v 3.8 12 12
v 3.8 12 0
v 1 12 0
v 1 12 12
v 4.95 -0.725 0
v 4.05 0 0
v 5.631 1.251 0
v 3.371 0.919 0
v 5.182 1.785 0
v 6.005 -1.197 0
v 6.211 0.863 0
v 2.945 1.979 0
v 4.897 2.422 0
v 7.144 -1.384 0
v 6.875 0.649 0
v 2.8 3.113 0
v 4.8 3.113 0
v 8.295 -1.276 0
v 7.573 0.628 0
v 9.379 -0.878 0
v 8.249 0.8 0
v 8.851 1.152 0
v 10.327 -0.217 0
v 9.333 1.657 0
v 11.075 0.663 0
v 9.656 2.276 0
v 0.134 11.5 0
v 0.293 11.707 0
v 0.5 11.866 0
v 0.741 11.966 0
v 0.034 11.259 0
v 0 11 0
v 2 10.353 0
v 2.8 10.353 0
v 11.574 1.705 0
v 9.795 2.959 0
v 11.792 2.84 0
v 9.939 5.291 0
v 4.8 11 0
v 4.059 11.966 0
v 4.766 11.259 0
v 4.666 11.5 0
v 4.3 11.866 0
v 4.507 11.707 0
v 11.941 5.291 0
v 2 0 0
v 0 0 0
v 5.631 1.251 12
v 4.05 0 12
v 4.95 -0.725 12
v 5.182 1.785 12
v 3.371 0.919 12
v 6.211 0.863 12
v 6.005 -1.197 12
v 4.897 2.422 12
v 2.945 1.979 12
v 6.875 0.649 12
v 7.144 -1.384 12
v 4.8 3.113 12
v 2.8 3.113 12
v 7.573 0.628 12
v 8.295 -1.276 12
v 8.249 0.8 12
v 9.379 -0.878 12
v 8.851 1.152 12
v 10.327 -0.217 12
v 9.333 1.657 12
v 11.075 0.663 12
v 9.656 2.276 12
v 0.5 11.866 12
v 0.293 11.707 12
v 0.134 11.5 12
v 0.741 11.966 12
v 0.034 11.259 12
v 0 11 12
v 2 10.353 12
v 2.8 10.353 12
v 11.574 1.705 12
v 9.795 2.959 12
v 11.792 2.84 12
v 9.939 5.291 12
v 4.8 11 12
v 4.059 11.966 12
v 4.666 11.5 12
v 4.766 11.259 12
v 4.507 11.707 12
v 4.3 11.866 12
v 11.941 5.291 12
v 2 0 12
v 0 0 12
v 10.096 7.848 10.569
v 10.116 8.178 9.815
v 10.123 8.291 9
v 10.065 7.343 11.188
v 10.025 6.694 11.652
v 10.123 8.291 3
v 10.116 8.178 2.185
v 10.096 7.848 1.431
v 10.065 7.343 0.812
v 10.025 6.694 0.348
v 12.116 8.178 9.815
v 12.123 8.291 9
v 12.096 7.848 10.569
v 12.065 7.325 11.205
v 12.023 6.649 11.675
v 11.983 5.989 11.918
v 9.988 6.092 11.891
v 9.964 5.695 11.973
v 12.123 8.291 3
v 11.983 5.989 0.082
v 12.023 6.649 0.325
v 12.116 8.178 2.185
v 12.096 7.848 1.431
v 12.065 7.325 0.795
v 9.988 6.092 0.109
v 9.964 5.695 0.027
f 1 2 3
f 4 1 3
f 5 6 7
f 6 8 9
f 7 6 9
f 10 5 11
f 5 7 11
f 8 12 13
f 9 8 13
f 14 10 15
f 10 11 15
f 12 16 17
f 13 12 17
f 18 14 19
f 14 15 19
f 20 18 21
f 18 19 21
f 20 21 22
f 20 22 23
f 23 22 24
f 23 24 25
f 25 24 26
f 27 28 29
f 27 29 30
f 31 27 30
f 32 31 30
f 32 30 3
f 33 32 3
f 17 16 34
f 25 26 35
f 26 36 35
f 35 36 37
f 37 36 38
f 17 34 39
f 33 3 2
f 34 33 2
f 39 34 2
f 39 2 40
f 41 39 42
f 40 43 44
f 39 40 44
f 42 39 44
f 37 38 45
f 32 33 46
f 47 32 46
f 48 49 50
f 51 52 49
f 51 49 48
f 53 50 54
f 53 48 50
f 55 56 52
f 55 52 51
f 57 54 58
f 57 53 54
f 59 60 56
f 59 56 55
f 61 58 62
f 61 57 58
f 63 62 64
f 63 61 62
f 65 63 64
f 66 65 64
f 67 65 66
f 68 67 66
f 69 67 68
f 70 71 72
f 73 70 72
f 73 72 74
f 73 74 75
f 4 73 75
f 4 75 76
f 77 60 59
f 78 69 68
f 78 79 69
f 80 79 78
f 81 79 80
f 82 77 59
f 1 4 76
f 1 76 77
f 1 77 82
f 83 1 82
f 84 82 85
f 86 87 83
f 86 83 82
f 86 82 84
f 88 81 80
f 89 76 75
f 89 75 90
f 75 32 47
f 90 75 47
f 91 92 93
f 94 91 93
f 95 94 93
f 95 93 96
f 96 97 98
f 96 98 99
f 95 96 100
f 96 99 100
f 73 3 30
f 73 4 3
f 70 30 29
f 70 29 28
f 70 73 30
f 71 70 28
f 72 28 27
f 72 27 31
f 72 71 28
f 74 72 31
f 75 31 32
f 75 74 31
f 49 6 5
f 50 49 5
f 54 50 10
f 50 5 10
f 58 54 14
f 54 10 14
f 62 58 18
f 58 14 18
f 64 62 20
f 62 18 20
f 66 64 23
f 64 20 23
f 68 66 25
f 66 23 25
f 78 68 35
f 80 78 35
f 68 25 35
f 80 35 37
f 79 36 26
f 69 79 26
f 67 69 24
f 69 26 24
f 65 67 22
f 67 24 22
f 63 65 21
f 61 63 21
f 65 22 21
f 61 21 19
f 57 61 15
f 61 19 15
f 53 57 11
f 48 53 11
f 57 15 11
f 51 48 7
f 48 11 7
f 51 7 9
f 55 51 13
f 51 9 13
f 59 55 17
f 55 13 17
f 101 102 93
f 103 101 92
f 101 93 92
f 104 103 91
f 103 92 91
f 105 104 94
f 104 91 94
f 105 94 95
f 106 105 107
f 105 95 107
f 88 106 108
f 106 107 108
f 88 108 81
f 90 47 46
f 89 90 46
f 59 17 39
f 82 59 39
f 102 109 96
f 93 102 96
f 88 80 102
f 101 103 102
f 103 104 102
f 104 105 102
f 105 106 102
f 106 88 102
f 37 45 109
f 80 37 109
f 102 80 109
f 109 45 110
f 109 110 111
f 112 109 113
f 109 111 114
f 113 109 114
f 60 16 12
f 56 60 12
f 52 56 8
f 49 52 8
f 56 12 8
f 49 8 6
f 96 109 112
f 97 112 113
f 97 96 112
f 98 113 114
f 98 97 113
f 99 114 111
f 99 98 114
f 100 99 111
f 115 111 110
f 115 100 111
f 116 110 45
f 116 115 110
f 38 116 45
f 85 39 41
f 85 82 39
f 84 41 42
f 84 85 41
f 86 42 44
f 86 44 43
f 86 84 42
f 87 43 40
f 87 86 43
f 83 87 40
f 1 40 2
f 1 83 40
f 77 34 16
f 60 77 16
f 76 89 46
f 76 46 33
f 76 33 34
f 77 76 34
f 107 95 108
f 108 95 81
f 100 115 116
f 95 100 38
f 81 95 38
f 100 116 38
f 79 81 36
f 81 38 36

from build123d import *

# Parameters (mm, degrees)
F1_DEPTH = 12
F2_R     = 3
F3_R     = 1


with BuildPart() as f1:
    # F0 (on Top) → F1 (new body)
    with BuildSketch(Plane.XY):
        with BuildLine():
            Line((0, 12), (0, 0))
            Line((0, 0), (2, 0))
            Line((2, 0), (2, 10.3529319381))
            Line((2, 10.3529319381), (2.8, 10.3529319381))
            Line((2.8, 10.3529319381), (2.8, 3.1129138079))
            ThreePointArc((2.8, 3.1129138079), (3.3313730334, 5.2342341514), (4.8, 6.8545711946))
            Line((4.8, 6.8545711946), (4.8, 12))
            Line((4.8, 12), (0, 12))
        make_face()
        with BuildLine():
            Line((4.8, 3.1129138079), (4.8, 6.8545711946))
            ThreePointArc((4.8, 6.8545711946), (3.3313730334, 5.2342341514), (2.8, 3.1129138079))
            ThreePointArc((2.8, 3.1129138079), (3.1242899865, 1.4355808405), (4.0504203926, 0))
            Line((4.0504203926, 0), (4.8, 0))
            Line((4.8, 0), (4.8, 3.1129138079))
        make_face()
        with BuildLine():
            ThreePointArc((9.7952816589, 2.9593903809), (7.2232020421, 0.6140936715), (4.8, 3.1129138079))
            Line((4.8, 3.1129138079), (4.8, 0))
            Line((4.8, 0), (4.0504203926, 0))
            ThreePointArc((4.0504203926, 0), (8.8497267048, -1.1118166144), (11.7916968676, 2.83967536))
            ThreePointArc((11.7916968676, 2.83967536), (11.7979237379, 2.9762315199), (11.8, 3.1129138079))
            ThreePointArc((11.8, 3.1129138079), (11.3319192193, 5.1113200252), (10.0250544847, 6.6939860014))
            Line((10.0250544847, 6.6939860014), (9.7952816589, 2.9593903809))
        make_face()
        with BuildLine():
            Line((10.1232885867, 8.290626709), (10.0250544847, 6.6939860014))
            ThreePointArc((10.0250544847, 6.6939860014), (11.3319192193, 5.1113200252), (11.8, 3.1129138079))
            ThreePointArc((11.8, 3.1129138079), (11.7979237379, 2.9762315199), (11.7916968676, 2.83967536))
            Line((11.7916968676, 2.83967536), (12.1232885867, 8.290626709))
            Line((12.1232885867, 8.290626709), (10.1232885867, 8.290626709))
        make_face()
    extrude(amount=F1_DEPTH)

    # F2
    f2_edges = [f1.edges().sort_by_distance(p)[0] for p in [
        (11.123289, 8.290627, 12),
        (11.123289, 8.290627, 0),
    ]]
    fillet(f2_edges, radius=F2_R)

    # F3
    f3_edges = [f1.edges().sort_by_distance(p)[0] for p in [
        (0, 12, 6),
        (4.8, 12, 6),
    ]]
    fillet(f3_edges, radius=F3_R)


solid = f1.part
